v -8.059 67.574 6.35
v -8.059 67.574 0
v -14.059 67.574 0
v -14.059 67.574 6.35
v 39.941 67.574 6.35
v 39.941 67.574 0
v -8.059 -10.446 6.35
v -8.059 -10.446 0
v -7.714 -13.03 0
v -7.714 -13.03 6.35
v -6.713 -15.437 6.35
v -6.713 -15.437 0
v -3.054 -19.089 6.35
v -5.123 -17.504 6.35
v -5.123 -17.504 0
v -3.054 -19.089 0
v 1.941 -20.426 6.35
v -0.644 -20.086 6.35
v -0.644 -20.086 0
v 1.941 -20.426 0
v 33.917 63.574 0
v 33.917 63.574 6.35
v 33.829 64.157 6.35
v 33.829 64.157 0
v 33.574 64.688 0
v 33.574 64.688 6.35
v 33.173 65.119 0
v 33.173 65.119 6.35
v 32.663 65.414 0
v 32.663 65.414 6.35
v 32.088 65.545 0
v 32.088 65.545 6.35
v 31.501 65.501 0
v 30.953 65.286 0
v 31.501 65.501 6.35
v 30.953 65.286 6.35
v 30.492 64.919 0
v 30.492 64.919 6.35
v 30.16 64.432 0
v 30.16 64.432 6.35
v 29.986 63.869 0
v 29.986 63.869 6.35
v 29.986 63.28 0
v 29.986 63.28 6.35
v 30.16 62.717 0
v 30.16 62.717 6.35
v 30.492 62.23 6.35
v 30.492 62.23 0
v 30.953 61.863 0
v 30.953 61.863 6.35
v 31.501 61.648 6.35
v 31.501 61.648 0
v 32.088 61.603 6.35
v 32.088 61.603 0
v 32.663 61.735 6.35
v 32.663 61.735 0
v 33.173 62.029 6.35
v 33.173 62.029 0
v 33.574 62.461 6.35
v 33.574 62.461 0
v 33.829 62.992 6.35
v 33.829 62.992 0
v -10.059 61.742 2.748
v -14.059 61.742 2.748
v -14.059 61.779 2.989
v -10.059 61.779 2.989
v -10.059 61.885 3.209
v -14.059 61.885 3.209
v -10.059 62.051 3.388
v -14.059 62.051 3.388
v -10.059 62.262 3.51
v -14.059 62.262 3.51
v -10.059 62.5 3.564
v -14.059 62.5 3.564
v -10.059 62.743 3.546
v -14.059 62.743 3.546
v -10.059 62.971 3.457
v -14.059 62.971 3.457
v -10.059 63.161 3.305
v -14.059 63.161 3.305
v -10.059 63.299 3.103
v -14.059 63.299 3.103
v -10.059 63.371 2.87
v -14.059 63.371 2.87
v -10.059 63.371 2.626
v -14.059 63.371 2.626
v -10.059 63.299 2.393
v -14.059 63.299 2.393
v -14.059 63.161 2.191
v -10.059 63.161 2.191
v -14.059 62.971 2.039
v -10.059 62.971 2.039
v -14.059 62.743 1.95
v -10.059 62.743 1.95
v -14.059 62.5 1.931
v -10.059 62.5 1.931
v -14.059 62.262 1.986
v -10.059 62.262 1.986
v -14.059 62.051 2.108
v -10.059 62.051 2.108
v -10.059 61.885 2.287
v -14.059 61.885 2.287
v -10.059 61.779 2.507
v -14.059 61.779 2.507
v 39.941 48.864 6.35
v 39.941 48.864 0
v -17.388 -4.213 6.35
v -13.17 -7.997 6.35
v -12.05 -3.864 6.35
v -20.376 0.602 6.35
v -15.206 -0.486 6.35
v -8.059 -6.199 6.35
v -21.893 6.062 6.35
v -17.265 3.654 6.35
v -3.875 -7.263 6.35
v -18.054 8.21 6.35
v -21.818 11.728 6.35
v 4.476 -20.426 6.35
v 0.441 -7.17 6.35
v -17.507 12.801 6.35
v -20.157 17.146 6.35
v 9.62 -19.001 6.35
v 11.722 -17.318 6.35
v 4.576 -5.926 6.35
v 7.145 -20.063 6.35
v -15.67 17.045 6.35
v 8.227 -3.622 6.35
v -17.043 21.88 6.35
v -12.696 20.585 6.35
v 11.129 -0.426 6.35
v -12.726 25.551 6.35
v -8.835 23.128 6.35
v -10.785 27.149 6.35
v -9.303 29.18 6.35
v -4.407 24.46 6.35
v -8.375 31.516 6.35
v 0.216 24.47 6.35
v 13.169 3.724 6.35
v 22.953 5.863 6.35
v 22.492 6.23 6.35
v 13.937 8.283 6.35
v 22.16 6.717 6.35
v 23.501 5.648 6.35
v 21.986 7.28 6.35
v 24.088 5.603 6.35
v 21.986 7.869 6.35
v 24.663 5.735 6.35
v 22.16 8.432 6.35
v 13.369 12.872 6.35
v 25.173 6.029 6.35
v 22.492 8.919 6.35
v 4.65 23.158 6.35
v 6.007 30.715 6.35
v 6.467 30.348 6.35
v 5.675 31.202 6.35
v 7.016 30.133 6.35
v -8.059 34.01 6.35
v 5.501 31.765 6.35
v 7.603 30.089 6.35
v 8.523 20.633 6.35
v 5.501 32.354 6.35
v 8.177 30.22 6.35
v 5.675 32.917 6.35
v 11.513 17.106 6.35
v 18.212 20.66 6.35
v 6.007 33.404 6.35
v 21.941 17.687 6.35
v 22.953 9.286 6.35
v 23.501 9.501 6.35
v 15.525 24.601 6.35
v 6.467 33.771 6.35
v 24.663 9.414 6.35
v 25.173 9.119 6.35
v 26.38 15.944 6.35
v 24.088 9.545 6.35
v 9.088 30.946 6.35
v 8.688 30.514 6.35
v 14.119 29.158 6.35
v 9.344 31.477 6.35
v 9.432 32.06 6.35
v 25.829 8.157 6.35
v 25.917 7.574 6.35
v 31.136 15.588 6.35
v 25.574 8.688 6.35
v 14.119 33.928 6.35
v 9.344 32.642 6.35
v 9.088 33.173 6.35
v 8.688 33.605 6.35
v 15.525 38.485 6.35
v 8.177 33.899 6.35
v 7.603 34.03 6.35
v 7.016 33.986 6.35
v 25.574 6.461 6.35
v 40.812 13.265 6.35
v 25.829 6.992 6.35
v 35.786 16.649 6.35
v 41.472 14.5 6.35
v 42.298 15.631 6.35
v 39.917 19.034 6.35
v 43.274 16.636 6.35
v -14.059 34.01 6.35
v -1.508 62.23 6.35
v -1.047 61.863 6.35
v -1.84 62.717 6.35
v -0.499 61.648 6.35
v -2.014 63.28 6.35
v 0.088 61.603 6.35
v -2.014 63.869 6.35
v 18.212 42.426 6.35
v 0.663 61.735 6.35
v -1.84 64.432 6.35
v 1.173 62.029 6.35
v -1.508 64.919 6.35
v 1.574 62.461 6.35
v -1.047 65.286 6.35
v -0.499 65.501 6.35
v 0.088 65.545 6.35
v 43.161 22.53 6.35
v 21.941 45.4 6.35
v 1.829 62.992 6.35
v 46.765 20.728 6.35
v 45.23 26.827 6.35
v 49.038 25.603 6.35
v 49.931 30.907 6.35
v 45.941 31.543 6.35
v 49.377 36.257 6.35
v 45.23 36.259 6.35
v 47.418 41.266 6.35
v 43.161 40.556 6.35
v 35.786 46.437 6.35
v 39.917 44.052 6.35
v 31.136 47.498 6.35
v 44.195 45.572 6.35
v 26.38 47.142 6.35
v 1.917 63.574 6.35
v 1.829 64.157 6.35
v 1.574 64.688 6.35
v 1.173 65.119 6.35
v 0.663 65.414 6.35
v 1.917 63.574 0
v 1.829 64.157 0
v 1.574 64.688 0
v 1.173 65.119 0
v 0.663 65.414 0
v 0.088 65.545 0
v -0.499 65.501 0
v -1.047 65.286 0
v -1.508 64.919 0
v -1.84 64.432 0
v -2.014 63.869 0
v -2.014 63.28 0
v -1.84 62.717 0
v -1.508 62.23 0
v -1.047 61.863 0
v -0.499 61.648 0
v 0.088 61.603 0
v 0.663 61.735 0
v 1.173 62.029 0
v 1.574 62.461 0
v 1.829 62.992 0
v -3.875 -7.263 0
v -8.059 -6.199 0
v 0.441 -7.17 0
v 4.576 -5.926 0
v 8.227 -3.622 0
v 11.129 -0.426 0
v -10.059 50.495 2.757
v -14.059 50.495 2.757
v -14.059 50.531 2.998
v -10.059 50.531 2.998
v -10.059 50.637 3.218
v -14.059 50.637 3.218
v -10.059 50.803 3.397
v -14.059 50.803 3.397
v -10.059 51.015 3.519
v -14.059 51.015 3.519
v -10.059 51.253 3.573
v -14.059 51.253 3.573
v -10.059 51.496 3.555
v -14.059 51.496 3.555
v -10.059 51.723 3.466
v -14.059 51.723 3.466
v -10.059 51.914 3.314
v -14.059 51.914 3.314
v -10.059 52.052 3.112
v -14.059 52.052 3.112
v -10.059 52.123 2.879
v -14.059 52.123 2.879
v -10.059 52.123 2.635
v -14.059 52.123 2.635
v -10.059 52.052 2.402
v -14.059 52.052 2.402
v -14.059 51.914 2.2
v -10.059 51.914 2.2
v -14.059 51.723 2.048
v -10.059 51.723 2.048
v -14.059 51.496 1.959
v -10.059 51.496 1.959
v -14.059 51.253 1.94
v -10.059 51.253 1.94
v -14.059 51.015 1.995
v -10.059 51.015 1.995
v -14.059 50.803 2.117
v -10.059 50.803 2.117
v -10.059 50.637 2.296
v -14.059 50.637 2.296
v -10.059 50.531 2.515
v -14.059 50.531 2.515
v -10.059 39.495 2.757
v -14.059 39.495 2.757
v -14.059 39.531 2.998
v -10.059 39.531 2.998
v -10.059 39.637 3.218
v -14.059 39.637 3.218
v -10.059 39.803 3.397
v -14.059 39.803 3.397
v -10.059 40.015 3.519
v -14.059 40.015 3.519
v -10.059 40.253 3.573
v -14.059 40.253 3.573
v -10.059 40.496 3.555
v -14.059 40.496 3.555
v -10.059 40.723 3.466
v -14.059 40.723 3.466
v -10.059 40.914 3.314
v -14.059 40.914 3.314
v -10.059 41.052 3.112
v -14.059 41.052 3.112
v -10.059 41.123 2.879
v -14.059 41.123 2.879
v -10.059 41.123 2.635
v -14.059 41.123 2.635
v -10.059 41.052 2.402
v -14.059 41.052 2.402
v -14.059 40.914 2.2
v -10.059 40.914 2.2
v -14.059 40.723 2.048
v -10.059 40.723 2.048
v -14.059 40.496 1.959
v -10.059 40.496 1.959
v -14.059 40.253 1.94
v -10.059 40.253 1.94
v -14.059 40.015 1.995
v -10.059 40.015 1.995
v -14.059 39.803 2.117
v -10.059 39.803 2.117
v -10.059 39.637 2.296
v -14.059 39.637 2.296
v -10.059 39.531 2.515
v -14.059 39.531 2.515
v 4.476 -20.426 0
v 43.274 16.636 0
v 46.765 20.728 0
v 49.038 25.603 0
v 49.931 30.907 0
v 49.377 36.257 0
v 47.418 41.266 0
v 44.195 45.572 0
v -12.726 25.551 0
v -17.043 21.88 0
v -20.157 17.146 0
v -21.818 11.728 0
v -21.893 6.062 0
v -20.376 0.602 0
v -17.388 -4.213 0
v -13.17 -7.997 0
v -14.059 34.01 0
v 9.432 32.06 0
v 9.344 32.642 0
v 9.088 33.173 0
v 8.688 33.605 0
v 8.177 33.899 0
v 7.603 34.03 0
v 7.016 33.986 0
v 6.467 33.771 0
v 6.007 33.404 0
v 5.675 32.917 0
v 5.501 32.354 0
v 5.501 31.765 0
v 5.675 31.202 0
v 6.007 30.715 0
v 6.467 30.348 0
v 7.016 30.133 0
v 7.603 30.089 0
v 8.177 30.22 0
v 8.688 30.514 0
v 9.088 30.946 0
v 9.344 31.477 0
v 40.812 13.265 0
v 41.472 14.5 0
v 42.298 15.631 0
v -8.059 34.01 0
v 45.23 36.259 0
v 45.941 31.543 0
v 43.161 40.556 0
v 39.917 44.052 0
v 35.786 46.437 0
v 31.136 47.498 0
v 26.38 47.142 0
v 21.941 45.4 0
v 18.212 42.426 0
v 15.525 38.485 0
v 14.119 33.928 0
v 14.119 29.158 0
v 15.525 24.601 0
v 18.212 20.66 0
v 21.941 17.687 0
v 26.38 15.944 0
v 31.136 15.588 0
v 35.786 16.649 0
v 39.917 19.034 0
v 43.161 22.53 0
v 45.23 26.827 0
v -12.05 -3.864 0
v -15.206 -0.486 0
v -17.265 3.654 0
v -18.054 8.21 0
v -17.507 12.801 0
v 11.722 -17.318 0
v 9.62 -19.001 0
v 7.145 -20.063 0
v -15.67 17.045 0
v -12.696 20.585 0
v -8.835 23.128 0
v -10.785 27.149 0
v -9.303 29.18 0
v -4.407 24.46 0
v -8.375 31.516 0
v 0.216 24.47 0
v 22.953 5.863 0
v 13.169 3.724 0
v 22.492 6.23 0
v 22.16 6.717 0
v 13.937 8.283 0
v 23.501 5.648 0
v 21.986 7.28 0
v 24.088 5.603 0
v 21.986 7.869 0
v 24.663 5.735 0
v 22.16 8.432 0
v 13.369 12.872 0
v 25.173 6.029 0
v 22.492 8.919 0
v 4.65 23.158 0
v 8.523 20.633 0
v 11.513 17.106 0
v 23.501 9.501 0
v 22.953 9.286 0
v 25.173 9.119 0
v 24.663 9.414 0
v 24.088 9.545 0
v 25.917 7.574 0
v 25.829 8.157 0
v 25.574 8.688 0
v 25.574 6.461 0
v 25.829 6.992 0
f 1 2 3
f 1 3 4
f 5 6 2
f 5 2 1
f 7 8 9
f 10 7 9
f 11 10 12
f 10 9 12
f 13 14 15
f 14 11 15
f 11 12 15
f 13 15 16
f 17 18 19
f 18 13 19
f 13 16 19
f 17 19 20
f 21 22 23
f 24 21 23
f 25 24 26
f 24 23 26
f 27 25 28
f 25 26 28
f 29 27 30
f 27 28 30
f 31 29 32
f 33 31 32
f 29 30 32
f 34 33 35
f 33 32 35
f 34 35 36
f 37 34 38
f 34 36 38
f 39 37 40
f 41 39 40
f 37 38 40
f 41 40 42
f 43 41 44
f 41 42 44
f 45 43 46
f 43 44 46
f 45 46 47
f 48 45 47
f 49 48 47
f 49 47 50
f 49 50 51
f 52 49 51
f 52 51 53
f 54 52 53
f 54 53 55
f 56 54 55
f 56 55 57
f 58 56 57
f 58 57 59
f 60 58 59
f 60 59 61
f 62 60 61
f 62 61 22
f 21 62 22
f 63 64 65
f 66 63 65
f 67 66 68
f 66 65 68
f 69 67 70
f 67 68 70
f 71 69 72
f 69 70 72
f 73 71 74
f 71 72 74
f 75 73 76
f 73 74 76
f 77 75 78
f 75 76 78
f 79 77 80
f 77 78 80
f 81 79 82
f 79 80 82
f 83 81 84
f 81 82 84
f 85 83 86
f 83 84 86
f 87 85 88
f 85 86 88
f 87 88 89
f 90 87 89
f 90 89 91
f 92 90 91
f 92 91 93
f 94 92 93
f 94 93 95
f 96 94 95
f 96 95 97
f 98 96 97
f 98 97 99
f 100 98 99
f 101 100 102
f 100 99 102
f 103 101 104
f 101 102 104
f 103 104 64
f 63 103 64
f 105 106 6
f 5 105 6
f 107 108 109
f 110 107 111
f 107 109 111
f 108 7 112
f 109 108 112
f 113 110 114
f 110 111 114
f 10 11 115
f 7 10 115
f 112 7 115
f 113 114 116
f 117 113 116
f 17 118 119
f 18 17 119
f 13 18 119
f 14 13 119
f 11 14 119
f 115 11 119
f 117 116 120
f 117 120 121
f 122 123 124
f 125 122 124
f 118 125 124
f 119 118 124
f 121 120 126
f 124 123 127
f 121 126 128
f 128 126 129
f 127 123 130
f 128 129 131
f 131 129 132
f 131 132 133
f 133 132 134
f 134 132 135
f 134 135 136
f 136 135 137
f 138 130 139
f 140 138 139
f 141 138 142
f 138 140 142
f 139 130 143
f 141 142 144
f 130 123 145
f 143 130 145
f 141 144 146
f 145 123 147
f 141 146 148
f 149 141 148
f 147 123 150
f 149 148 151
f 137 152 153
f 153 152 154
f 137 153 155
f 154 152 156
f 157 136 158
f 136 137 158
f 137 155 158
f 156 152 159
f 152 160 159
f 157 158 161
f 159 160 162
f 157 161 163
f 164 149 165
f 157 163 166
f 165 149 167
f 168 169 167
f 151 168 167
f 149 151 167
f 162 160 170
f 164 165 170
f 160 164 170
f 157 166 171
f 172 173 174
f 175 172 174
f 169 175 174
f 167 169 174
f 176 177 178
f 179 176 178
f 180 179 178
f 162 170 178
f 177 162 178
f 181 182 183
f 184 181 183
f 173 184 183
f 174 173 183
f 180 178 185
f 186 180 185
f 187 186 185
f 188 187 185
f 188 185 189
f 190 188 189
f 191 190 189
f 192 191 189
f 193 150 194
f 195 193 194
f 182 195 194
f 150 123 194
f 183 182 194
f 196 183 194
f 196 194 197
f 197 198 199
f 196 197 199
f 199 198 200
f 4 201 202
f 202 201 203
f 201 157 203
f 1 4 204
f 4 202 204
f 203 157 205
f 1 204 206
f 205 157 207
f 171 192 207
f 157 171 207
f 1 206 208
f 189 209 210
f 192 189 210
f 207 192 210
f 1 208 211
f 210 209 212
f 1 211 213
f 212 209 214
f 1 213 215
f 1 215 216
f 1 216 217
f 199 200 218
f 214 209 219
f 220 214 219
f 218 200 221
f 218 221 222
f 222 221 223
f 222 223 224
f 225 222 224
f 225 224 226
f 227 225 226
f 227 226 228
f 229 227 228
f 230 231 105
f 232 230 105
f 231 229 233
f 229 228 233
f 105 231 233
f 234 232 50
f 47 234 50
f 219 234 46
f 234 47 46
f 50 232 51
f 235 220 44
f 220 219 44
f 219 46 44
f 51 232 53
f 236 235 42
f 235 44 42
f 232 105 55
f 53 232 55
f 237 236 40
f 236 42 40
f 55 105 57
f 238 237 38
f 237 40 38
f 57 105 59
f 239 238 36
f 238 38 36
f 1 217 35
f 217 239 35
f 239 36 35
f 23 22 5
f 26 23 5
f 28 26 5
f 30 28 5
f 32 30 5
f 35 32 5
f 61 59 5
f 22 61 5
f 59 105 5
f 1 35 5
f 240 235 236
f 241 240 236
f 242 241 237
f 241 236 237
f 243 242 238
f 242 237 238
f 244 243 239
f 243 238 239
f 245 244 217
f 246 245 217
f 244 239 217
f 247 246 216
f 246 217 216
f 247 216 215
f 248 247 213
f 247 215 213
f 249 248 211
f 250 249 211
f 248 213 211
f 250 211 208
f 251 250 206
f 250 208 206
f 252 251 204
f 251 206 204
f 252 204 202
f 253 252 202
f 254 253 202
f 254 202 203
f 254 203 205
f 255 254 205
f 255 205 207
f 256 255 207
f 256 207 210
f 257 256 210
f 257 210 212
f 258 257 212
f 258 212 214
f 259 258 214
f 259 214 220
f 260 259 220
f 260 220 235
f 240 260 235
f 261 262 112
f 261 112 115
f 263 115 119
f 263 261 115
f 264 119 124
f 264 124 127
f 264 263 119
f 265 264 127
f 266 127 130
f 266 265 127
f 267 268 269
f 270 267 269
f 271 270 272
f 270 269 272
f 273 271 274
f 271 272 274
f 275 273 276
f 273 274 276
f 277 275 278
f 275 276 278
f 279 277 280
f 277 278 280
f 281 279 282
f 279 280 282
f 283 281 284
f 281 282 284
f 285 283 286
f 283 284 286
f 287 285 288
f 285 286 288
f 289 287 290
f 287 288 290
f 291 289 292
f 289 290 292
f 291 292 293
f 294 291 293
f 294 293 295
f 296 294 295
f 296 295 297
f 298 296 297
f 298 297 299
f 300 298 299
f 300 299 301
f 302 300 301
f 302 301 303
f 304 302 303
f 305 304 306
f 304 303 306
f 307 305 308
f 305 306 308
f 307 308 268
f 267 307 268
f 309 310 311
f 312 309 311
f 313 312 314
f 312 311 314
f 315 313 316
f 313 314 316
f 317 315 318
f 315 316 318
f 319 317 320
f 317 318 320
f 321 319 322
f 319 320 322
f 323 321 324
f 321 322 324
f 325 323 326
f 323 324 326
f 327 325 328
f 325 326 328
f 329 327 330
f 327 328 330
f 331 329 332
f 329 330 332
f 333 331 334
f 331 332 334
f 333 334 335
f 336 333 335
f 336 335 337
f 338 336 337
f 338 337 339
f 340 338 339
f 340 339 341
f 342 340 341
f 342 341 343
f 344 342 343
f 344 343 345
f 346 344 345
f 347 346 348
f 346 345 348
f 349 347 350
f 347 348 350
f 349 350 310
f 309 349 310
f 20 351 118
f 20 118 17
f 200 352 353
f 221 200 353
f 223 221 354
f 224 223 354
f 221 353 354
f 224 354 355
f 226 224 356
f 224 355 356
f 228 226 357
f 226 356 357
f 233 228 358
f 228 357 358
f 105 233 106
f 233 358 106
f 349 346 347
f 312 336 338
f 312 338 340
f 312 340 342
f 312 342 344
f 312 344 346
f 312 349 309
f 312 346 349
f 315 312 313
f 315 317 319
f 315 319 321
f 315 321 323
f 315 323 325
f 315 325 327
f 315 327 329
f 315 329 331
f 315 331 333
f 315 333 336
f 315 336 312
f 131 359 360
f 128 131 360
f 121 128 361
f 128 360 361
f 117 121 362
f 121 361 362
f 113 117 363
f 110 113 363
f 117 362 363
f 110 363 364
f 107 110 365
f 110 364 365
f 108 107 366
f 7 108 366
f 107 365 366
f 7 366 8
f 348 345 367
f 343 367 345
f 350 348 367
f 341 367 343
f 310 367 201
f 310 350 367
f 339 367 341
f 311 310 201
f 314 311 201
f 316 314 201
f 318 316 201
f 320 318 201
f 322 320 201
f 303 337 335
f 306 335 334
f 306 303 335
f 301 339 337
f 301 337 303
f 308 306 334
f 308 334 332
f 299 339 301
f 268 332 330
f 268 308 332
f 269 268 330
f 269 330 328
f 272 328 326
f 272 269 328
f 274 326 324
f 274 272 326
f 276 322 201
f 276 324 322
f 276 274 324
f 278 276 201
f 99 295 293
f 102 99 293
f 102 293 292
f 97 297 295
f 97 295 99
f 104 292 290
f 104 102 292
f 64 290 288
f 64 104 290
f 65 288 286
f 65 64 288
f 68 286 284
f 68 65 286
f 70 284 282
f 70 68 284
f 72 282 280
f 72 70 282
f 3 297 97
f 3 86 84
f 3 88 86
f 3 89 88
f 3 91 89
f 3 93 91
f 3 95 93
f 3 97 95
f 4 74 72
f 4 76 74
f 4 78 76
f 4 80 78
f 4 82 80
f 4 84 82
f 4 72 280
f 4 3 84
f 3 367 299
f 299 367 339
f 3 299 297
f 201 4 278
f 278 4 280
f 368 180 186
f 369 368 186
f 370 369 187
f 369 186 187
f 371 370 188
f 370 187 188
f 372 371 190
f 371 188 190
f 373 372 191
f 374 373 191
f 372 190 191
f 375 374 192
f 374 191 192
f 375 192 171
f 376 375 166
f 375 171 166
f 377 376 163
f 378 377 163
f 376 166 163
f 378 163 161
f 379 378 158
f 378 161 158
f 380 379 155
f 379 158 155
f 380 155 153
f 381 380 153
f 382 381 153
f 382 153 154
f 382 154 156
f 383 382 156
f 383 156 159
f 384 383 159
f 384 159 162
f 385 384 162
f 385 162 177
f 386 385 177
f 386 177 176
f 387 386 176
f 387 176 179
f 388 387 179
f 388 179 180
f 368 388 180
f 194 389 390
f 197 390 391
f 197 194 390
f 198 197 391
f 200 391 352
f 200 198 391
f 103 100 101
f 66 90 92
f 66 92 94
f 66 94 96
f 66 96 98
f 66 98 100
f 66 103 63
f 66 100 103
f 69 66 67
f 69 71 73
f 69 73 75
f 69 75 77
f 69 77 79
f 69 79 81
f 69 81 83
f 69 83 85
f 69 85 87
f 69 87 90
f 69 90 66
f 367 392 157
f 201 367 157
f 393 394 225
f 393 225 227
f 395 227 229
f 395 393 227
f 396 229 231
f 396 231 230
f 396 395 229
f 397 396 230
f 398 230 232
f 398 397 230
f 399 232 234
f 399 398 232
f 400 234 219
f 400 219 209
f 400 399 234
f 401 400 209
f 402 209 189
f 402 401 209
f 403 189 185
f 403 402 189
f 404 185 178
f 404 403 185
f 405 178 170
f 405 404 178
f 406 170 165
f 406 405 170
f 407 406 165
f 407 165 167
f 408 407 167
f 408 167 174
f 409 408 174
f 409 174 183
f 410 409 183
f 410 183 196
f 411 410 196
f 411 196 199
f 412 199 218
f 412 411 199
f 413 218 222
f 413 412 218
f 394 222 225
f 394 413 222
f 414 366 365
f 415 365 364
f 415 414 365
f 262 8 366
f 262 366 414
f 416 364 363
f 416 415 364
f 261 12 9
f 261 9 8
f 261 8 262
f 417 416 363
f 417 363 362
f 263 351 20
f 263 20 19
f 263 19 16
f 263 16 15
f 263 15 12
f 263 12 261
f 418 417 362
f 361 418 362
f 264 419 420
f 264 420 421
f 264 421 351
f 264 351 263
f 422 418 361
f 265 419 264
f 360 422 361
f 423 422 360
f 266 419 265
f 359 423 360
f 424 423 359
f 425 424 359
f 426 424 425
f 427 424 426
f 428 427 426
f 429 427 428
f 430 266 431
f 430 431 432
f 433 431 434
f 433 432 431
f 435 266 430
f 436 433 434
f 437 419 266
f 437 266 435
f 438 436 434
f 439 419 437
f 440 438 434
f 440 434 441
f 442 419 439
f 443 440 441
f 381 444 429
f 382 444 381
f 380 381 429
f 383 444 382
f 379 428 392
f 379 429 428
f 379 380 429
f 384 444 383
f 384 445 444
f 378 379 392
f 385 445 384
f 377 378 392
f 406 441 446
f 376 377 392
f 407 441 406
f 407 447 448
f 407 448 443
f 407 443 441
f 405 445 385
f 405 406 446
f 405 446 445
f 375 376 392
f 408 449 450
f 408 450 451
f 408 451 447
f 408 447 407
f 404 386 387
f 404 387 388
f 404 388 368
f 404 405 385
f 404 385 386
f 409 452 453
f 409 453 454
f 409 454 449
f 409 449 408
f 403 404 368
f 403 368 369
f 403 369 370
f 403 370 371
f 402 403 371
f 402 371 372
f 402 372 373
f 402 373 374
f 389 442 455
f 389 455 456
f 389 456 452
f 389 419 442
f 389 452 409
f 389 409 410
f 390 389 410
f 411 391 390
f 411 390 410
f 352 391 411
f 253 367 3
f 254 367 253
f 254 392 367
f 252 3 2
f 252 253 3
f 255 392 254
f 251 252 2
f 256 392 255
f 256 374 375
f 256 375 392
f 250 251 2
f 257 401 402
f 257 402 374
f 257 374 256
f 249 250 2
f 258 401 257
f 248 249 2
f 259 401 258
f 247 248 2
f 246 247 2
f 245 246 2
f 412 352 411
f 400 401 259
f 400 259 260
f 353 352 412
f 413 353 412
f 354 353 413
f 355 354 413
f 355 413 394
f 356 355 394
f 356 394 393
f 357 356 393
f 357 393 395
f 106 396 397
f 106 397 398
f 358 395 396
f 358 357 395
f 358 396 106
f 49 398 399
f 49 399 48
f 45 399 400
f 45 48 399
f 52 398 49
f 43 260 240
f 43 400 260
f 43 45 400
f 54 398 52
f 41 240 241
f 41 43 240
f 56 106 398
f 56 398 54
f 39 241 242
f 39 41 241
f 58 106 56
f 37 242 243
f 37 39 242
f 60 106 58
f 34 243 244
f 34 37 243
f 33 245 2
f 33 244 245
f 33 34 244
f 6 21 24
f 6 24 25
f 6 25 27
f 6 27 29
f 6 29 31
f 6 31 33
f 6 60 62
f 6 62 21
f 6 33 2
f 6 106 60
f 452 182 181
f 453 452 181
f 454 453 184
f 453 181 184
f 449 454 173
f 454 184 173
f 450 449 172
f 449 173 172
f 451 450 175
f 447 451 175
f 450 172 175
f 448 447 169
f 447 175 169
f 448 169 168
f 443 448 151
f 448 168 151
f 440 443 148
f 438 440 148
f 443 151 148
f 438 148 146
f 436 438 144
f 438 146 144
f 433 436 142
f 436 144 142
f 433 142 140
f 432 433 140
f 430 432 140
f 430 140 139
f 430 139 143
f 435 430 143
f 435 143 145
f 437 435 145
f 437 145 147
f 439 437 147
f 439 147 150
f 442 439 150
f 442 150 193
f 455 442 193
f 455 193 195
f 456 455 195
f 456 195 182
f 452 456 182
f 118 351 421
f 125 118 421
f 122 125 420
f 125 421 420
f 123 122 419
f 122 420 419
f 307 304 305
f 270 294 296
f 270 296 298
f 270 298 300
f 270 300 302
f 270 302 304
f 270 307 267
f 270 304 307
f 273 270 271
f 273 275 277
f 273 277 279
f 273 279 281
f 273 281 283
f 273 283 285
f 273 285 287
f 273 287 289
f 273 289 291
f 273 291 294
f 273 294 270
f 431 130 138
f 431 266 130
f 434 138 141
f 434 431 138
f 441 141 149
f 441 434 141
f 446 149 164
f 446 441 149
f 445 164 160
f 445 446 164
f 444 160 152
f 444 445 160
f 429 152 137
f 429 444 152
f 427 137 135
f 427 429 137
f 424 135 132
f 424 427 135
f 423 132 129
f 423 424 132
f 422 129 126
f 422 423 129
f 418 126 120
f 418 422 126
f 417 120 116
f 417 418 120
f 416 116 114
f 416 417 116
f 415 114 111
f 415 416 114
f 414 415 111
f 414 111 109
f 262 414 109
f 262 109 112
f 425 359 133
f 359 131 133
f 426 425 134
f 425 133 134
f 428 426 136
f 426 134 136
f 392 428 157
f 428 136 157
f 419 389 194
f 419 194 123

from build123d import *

# Parameters (mm, degrees)
SKETCH1_R           = 16
BOSS_EXTRUDE1_DEPTH = 6.35
FILLET1_R           = 10
SKETCH2_W           = 48
SKETCH2_H           = 20
BOSS_EXTRUDE2_DEPTH = 6.35
SKETCH4_W           = 6.35
SKETCH4_H           = 33.563954303
BOSS_EXTRUDE3_DEPTH = 6
SKETCH5_R           = 1.976318005
CUT_EXTRUDE1_DEPTH  = 85.265533897
SKETCH6_R           = 0.818763353
CUT_EXTRUDE2_DEPTH  = 4
CUT_EXTRUDE3_DEPTH  = 85.265533897
FILLET2_R           = 10


with BuildPart() as part:
    # Sketch1 → Boss-Extrude1 (new body)
    with BuildSketch(Plane.XY):
        with BuildLine():
            Line((15.771494463, -0.425728707), (39.940720481, -0.425728707))
            Line((39.940720481, -0.425728707), (39.940720481, 14.222654346))
            ThreePointArc((39.940720481, 14.222654346), (46.645253692, 42.541279088), (17.982311374, 47.574271293))
            Line((17.982311374, 47.574271293), (-8.059279519, 47.574271293))
            Line((-8.059279519, 47.574271293), (-8.059279519, 27.711945938))
            ThreePointArc((-8.059279519, 27.711945938), (-17.321126946, -4.292626776), (15.771494463, -0.425728707))
        make_face()
        with Locations((-2.059279519, 8.63316191)):
            Circle(SKETCH1_R, mode=Mode.SUBTRACT)
        with Locations((29.940720481, 31.543162422)):
            Circle(SKETCH1_R, mode=Mode.SUBTRACT)
    extrude(amount=BOSS_EXTRUDE1_DEPTH)

    # Fillet1
    fillet1_edges = [part.edges().sort_by_distance(p)[0] for p in [
        (17.982311374, 47.574271293, 3.175),
        (39.940720481, 14.222654346, 3.175),
        (15.771494463, -0.425728707, 3.175),
        (-8.059279519, 27.711945938, 3.175),
    ]]
    fillet(fillet1_edges, radius=FILLET1_R)

    # Sketch2 → Boss-Extrude2 (add)
    with BuildSketch(Plane(origin=(0, 0, 0), x_dir=(-1, 0, 0), z_dir=(0, 0, -1))):
        with Locations((-15.940720481, 57.574271293)):
            Rectangle(SKETCH2_W, SKETCH2_H)
        with BuildLine():
            Line((-39.940720481, -0.425728707), (-39.940720481, -20.425728707))
            Line((-39.940720481, -20.425728707), (8.059279519, -20.425728707))
            Line((8.059279519, -20.425728707), (8.059279519, -6.199235065))
            ThreePointArc((8.059279519, -6.199235065), (-2.550706673, -6.68832716), (-11.129219288, -0.425728707))
            Line((-11.129219288, -0.425728707), (-39.940720481, -0.425728707))
        make_face()
    extrude(amount=-BOSS_EXTRUDE2_DEPTH)

    # Sketch4 → Boss-Extrude3 (add)
    with BuildSketch(Plane.ZY.offset(8.059279519)):
        with Locations((3.175, 50.792294142)):
            Rectangle(SKETCH4_W, SKETCH4_H)
    extrude(amount=BOSS_EXTRUDE3_DEPTH)

    # Sketch5 → Cut-Extrude1 (cut, through all)
    with BuildSketch(Plane.XY.offset(6.35)):
        with Locations((31.940720481, 63.574271293)):
            Circle(SKETCH5_R)
        with Locations((-0.059279519, 63.574271293)):
            Circle(SKETCH5_R)
        with Locations((23.940720481, 7.574271293)):
            Circle(SKETCH5_R)
        with Locations((7.455439106, 32.059552667)):
            Circle(SKETCH5_R)
    extrude(amount=-CUT_EXTRUDE1_DEPTH, mode=Mode.SUBTRACT)

    # Sketch6 → Cut-Extrude2 (cut)
    with BuildSketch(Plane.ZY.offset(14.059279519)):
        with Locations(Location((2.747841942, 62.56121214, 0), (0, 0, 270))):
            Circle(SKETCH6_R)
        with Locations(Location((2.756756589, 51.313832117, 0), (0, 0, 270))):
            Circle(SKETCH6_R)
        with Locations(Location((2.756756589, 40.313832117, 0), (0, 0, 270))):
            Circle(SKETCH6_R)
    extrude(amount=-CUT_EXTRUDE2_DEPTH, mode=Mode.SUBTRACT)

    # Sketch7 → Cut-Extrude3 (cut, through all)
    with BuildSketch(Plane(origin=(0, 0, 0), x_dir=(-1, 0, 0), z_dir=(0, 0, -1))):
        Polygon((-40.812011189, 13.264965551), (-6.140614995, -23.185471789), (-44.163616568, -23.185471789), (-44.163616568, 13.264965551), align=None)
    extrude(amount=-CUT_EXTRUDE3_DEPTH, mode=Mode.SUBTRACT)

    # Fillet2
    # the kernel refuses this fillet: 10 mm, written as the material it takes off along each edge
    with BuildSketch(Plane(origin=(-8.059279519, -20.425728707, -25), x_dir=(1, 0, 0), z_dir=(0, 0, 1))) as fillet2_piece_1_section:
        with BuildLine():
            CenterArc((FILLET2_R, FILLET2_R), FILLET2_R, 180, 90)
            Line((0, FILLET2_R), (0, 0))
            Line((0, 0), (FILLET2_R, 0))
        make_face()
    fillet2_piece_1 = extrude(amount=56.35, mode=Mode.PRIVATE)
    fillet2_piece_1 = fillet2_piece_1 - Plane(origin=(-2.059279519, 8.63316191, 3.175), x_dir=(-0.30000000000000054, 0.9539392014169455, 0), z_dir=(0, 0, -1)) * Cylinder(20, 153, mode=Mode.PRIVATE)
    add(fillet2_piece_1, mode=Mode.SUBTRACT)
    with BuildSketch(Plane(origin=(8.765662944, -20.425728707, -10.72351028), x_dir=(0.6892036325040336, 0.7245677007314395, 0), z_dir=(0, 0, 1))) as fillet2_piece_2:
        with BuildLine():
            CenterArc((FILLET2_R * 0.428940411203, FILLET2_R), FILLET2_R, 223.567102496, 46.432897504)
            Line((-FILLET2_R * 0.295627289529, FILLET2_R * 0.310796367496), (0, 0))
            Line((0, 0), (FILLET2_R * 0.428940411203, 0))
        make_face()
    extrude(amount=27.79702056, mode=Mode.SUBTRACT)


solid = part.part
